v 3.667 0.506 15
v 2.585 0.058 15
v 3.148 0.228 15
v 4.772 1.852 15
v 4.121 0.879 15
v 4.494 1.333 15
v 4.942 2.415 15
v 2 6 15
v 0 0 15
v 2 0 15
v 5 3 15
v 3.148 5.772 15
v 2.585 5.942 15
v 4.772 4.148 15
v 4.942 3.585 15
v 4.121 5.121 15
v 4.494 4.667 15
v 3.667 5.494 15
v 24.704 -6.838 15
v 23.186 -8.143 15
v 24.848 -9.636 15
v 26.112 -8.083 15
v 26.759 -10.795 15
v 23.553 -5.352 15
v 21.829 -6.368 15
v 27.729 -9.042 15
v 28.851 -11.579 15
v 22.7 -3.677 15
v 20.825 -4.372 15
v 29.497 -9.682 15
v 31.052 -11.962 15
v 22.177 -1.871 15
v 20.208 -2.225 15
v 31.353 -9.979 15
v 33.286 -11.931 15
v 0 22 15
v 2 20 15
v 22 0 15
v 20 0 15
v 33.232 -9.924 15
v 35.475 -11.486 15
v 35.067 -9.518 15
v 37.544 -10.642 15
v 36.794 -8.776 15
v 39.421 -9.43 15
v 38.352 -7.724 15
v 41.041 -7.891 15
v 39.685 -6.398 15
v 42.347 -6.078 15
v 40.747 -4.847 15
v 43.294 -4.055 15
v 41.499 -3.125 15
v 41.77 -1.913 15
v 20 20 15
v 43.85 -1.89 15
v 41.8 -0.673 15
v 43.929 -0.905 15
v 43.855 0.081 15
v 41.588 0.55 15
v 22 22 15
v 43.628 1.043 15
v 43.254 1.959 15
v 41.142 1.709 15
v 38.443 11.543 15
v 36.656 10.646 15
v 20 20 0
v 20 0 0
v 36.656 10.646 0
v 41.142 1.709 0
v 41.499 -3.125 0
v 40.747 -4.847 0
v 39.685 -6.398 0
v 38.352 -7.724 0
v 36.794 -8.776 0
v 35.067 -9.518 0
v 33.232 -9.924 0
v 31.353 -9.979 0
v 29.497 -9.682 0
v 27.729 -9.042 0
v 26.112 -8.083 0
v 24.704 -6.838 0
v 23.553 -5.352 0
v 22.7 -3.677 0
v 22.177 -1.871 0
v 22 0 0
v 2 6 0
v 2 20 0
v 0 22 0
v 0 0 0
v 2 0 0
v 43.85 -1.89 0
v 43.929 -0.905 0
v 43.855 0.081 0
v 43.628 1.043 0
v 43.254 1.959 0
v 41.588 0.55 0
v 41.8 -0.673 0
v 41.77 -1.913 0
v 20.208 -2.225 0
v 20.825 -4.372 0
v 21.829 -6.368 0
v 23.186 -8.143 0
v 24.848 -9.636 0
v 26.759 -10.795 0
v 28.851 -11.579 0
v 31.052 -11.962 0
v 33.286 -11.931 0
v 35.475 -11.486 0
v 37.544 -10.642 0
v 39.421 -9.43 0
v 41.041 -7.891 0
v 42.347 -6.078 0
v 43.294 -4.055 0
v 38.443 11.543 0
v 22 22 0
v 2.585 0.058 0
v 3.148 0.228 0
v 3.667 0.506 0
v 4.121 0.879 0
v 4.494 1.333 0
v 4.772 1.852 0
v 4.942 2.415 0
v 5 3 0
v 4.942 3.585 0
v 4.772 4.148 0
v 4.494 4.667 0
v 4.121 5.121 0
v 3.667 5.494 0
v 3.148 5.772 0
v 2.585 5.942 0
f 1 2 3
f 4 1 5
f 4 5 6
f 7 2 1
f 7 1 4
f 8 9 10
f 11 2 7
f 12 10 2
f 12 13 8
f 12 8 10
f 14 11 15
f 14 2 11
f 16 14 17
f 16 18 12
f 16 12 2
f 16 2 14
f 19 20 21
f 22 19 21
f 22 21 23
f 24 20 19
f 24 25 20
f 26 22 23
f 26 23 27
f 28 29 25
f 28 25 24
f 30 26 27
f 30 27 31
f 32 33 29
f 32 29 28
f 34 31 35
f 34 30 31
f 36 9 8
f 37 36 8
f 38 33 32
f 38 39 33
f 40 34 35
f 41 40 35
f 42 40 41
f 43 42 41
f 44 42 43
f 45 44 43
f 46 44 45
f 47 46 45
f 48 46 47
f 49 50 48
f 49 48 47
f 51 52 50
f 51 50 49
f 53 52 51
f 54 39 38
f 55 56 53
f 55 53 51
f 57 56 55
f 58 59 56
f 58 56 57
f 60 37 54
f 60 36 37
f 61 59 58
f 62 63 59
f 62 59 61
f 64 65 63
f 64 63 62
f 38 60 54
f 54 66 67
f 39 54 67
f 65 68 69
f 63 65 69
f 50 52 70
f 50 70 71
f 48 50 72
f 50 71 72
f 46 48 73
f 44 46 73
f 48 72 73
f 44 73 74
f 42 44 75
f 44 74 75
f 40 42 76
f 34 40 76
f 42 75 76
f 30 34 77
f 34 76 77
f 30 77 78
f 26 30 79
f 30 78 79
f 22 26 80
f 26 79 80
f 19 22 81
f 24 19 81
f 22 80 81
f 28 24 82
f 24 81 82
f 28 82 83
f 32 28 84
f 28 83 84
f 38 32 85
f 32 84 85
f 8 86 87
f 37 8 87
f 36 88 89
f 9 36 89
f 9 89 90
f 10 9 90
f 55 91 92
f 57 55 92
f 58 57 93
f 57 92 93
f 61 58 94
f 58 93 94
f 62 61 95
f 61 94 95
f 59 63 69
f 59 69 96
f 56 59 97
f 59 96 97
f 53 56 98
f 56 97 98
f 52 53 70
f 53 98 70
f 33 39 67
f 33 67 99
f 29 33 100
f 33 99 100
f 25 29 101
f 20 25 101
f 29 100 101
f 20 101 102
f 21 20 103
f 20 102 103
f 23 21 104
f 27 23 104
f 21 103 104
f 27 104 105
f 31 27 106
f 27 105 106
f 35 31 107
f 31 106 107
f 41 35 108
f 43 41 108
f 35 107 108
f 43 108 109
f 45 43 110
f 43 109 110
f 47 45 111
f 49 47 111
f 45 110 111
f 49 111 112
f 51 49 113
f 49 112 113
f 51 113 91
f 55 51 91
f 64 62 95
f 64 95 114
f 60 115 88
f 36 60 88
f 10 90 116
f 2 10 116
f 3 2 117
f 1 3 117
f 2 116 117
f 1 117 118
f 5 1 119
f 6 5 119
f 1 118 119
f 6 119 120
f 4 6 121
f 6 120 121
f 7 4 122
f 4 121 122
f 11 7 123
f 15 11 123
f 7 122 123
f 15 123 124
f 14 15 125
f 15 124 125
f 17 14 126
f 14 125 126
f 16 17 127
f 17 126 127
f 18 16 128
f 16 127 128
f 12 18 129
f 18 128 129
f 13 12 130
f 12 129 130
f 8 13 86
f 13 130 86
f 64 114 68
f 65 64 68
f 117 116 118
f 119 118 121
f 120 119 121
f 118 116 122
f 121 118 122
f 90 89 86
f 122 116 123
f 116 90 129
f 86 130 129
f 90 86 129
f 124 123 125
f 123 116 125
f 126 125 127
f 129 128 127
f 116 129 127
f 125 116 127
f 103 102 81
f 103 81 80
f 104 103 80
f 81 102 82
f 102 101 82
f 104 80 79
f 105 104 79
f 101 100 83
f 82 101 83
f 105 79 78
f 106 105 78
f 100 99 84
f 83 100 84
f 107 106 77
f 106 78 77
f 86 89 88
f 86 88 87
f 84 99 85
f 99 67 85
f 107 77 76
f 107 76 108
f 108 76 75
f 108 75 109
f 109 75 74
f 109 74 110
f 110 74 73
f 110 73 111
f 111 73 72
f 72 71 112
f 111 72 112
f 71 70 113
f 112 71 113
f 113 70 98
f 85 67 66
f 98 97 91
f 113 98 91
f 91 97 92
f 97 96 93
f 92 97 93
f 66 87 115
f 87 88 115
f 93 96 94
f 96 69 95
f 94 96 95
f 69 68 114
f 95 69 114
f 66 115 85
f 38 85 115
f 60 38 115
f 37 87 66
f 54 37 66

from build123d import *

# Parameters (mm, degrees)
F1_DEPTH = 15


with BuildPart() as f1:
    # F0 (on Top) → F1 (new body)
    with BuildSketch(Plane.XY):
        with BuildLine():
            Line((0, 22), (0, 0))
            Line((0, 0), (2, 0))
            ThreePointArc((2, 0), (5, 3), (2, 6))
            Line((2, 6), (2, 20))
            Line((2, 20), (20, 20))
            Line((20, 20), (20, 0))
            ThreePointArc((20, 0), (31.051796, -11.962479), (43.850152, -1.890478))
            ThreePointArc((43.850152, -1.890478), (43.854746, 0.081043), (43.254428, 1.958949))
            Line((43.254428, 1.958949), (38.442937, 11.542894))
            Line((38.442937, 11.542894), (36.655541, 10.645556))
            Line((36.655541, 10.645556), (41.142232, 1.708576))
            ThreePointArc((41.142232, 1.708576), (41.79999, -0.672597), (41.499315, -3.124582))
            ThreePointArc((41.499315, -3.124582), (30.417779, -9.874035), (22, 0))
            Line((22, 0), (22, 22))
            Line((22, 22), (0, 22))
        make_face()
    extrude(amount=F1_DEPTH)


solid = f1.part
